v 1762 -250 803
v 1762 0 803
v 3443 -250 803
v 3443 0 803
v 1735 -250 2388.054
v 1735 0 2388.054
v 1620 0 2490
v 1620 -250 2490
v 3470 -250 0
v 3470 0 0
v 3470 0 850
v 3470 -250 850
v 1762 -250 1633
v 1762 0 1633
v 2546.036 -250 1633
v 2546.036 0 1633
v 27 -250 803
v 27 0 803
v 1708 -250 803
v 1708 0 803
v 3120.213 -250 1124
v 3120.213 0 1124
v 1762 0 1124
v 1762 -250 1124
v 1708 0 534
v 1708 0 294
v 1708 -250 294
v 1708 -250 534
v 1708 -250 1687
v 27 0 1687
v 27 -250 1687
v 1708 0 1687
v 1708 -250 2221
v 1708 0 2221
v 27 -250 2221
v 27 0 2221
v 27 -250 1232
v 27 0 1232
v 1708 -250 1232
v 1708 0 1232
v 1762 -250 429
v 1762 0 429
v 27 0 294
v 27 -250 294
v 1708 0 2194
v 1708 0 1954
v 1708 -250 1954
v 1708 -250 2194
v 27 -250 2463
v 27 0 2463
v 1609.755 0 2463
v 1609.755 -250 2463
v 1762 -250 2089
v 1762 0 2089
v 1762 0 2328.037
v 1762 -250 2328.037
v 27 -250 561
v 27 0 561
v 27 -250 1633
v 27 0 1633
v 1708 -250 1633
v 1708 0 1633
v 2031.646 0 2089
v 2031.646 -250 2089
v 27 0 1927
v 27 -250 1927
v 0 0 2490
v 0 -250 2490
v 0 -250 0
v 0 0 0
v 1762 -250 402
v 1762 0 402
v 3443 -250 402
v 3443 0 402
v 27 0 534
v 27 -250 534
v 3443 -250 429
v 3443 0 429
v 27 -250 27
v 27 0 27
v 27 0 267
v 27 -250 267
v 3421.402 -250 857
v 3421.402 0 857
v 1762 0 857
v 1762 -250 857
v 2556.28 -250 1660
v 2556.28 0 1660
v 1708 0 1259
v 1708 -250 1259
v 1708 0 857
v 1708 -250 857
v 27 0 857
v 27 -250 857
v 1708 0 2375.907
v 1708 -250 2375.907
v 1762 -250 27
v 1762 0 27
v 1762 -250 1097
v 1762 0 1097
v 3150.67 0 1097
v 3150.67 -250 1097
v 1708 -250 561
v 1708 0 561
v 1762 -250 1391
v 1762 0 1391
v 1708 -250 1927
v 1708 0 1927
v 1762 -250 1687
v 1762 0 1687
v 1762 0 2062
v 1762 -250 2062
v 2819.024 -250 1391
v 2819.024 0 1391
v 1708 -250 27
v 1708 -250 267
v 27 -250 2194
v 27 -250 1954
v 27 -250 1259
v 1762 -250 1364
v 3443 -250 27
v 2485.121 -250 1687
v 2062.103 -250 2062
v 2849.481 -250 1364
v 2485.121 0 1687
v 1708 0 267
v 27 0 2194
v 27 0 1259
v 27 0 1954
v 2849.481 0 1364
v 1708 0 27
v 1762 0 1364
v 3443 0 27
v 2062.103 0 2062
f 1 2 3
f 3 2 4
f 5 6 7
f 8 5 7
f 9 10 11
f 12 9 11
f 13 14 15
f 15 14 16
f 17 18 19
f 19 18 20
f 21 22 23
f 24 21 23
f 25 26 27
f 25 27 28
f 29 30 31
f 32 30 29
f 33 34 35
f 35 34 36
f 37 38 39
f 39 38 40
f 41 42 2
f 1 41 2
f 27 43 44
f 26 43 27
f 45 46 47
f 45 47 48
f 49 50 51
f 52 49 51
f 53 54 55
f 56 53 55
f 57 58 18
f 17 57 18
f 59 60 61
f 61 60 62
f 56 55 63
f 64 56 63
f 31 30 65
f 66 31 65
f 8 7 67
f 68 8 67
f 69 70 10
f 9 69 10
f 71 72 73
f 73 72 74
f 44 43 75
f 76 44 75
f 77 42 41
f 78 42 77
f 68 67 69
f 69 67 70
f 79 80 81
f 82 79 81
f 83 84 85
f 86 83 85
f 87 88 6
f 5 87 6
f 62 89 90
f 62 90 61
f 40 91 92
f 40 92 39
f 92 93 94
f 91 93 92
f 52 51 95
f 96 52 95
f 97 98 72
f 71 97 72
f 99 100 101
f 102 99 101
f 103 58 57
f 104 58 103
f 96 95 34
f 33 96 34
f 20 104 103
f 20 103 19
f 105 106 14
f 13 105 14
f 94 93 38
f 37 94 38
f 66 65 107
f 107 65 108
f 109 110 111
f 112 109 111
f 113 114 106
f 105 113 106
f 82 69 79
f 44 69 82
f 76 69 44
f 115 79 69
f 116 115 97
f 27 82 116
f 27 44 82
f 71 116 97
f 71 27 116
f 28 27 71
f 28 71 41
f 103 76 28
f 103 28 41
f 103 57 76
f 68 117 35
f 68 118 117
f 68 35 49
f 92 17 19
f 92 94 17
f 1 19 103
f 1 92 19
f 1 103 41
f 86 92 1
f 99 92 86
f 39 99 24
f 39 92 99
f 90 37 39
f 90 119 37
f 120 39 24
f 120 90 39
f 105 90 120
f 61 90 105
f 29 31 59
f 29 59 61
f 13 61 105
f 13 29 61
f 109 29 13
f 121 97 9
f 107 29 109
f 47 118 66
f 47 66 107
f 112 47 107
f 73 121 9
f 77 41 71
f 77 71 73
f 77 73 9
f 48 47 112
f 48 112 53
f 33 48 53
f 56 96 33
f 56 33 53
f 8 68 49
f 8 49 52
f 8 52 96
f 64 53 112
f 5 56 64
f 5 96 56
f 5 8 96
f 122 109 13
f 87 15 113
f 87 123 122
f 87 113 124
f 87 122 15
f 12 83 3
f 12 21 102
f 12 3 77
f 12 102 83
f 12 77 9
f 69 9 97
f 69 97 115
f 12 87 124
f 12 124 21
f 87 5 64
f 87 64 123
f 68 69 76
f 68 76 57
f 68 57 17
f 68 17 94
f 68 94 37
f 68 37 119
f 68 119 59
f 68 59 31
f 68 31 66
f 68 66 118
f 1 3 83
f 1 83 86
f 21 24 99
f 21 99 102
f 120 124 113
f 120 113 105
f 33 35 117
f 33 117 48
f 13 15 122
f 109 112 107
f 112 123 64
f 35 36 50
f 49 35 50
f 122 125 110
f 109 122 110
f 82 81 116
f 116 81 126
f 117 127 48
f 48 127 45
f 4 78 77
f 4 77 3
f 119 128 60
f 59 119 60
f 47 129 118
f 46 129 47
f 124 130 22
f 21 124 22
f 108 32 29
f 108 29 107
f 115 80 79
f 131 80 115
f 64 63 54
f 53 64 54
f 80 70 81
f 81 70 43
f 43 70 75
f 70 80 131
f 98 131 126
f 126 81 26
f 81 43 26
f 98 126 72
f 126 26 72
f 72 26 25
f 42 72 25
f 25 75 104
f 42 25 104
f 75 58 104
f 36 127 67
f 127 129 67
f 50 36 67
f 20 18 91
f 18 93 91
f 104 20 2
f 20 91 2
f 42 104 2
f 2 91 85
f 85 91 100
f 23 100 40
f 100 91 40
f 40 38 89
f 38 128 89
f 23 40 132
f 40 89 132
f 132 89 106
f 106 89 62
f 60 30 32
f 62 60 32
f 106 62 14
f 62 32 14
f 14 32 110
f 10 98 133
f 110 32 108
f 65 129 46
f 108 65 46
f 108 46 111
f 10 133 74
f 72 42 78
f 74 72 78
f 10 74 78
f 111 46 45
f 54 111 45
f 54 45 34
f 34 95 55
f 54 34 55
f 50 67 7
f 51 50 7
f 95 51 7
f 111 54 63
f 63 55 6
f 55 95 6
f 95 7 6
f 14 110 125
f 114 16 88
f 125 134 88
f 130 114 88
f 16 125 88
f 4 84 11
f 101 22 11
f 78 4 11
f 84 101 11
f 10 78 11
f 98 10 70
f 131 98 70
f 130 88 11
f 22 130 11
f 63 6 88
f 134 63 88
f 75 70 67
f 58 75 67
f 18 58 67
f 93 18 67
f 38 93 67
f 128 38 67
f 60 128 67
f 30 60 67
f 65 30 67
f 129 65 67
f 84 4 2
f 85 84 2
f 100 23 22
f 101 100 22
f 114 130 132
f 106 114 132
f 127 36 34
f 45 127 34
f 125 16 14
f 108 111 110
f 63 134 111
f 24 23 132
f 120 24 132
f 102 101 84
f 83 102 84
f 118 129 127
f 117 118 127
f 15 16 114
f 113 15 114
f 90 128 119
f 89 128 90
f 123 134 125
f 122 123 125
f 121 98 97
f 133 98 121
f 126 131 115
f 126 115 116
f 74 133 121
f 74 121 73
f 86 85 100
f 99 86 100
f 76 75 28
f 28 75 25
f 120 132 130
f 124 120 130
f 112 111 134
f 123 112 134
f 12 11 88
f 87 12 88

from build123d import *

# Parameters (mm, degrees)
F1_W     = 1735
F1_H     = 830
F1_W_2   = 1681
F1_H_2   = 240
F1_H_3   = 242
F1_H_4   = 375
F1_H_5   = 374
F2_DEPTH = 250


with BuildPart() as f2:
    # F1 (on face) → F2 (new body)
    with BuildSketch(Plane.XZ):
        with Locations((867.5, 415)):
            Rectangle(F1_W, F1_H)
        with Locations((867.5, 147)):
            Rectangle(F1_W_2, F1_H_2, mode=Mode.SUBTRACT)
        with Locations((867.5, 414)):
            Rectangle(F1_W_2, F1_H_2, mode=Mode.SUBTRACT)
        with Locations((867.5, 682)):
            Rectangle(F1_W_2, F1_H_3, mode=Mode.SUBTRACT)
        with Locations((2602.5, 415)):
            Rectangle(F1_W, F1_H)
        with Locations((2602.5, 214.5)):
            Rectangle(F1_W_2, F1_H_4, mode=Mode.SUBTRACT)
        with Locations((2602.5, 616)):
            Rectangle(F1_W_2, F1_H_5, mode=Mode.SUBTRACT)
        with Locations((867.5, 1245)):
            Rectangle(F1_W, F1_H)
        with Locations((867.5, 1044.5)):
            Rectangle(F1_W_2, F1_H_4, mode=Mode.SUBTRACT)
        with Locations((867.5, 1446)):
            Rectangle(F1_W_2, F1_H_5, mode=Mode.SUBTRACT)
        Polygon((1735, 1660), (1735, 830), (3470, 830), (3470, 850), (2556.280488, 1660), align=None)
        Polygon((3421.401716, 857), (1762, 857), (1762, 1097), (3150.670008, 1097), align=None, mode=Mode.SUBTRACT)
        Polygon((1762, 1124), (1762, 1364), (2849.480984, 1364), (3120.212691, 1124), align=None, mode=Mode.SUBTRACT)
        Polygon((1762, 1391), (1762, 1633), (2546.035862, 1633), (2819.023667, 1391), align=None, mode=Mode.SUBTRACT)
        Polygon((0, 2490), (0, 1660), (1735, 1660), (1735, 2388.054054), (1620, 2490), align=None)
        with Locations((867.5, 1807)):
            Rectangle(F1_W_2, F1_H_2, mode=Mode.SUBTRACT)
        with Locations((867.5, 2074)):
            Rectangle(F1_W_2, F1_H_2, mode=Mode.SUBTRACT)
        Polygon((27, 2221), (27, 2463), (1609.755374, 2463), (1708, 2375.907467), (1708, 2221), align=None, mode=Mode.SUBTRACT)
        Polygon((1735, 2388.054054), (1735, 1660), (2556.280488, 1660), align=None)
        Polygon((2485.121228, 1687), (1762, 1687), (1762, 2062), (2062.102935, 2062), align=None, mode=Mode.SUBTRACT)
        Polygon((1762, 2089), (1762, 2328.037196), (2031.645618, 2089), align=None, mode=Mode.SUBTRACT)
    extrude(amount=F2_DEPTH)


solid = f2.part
